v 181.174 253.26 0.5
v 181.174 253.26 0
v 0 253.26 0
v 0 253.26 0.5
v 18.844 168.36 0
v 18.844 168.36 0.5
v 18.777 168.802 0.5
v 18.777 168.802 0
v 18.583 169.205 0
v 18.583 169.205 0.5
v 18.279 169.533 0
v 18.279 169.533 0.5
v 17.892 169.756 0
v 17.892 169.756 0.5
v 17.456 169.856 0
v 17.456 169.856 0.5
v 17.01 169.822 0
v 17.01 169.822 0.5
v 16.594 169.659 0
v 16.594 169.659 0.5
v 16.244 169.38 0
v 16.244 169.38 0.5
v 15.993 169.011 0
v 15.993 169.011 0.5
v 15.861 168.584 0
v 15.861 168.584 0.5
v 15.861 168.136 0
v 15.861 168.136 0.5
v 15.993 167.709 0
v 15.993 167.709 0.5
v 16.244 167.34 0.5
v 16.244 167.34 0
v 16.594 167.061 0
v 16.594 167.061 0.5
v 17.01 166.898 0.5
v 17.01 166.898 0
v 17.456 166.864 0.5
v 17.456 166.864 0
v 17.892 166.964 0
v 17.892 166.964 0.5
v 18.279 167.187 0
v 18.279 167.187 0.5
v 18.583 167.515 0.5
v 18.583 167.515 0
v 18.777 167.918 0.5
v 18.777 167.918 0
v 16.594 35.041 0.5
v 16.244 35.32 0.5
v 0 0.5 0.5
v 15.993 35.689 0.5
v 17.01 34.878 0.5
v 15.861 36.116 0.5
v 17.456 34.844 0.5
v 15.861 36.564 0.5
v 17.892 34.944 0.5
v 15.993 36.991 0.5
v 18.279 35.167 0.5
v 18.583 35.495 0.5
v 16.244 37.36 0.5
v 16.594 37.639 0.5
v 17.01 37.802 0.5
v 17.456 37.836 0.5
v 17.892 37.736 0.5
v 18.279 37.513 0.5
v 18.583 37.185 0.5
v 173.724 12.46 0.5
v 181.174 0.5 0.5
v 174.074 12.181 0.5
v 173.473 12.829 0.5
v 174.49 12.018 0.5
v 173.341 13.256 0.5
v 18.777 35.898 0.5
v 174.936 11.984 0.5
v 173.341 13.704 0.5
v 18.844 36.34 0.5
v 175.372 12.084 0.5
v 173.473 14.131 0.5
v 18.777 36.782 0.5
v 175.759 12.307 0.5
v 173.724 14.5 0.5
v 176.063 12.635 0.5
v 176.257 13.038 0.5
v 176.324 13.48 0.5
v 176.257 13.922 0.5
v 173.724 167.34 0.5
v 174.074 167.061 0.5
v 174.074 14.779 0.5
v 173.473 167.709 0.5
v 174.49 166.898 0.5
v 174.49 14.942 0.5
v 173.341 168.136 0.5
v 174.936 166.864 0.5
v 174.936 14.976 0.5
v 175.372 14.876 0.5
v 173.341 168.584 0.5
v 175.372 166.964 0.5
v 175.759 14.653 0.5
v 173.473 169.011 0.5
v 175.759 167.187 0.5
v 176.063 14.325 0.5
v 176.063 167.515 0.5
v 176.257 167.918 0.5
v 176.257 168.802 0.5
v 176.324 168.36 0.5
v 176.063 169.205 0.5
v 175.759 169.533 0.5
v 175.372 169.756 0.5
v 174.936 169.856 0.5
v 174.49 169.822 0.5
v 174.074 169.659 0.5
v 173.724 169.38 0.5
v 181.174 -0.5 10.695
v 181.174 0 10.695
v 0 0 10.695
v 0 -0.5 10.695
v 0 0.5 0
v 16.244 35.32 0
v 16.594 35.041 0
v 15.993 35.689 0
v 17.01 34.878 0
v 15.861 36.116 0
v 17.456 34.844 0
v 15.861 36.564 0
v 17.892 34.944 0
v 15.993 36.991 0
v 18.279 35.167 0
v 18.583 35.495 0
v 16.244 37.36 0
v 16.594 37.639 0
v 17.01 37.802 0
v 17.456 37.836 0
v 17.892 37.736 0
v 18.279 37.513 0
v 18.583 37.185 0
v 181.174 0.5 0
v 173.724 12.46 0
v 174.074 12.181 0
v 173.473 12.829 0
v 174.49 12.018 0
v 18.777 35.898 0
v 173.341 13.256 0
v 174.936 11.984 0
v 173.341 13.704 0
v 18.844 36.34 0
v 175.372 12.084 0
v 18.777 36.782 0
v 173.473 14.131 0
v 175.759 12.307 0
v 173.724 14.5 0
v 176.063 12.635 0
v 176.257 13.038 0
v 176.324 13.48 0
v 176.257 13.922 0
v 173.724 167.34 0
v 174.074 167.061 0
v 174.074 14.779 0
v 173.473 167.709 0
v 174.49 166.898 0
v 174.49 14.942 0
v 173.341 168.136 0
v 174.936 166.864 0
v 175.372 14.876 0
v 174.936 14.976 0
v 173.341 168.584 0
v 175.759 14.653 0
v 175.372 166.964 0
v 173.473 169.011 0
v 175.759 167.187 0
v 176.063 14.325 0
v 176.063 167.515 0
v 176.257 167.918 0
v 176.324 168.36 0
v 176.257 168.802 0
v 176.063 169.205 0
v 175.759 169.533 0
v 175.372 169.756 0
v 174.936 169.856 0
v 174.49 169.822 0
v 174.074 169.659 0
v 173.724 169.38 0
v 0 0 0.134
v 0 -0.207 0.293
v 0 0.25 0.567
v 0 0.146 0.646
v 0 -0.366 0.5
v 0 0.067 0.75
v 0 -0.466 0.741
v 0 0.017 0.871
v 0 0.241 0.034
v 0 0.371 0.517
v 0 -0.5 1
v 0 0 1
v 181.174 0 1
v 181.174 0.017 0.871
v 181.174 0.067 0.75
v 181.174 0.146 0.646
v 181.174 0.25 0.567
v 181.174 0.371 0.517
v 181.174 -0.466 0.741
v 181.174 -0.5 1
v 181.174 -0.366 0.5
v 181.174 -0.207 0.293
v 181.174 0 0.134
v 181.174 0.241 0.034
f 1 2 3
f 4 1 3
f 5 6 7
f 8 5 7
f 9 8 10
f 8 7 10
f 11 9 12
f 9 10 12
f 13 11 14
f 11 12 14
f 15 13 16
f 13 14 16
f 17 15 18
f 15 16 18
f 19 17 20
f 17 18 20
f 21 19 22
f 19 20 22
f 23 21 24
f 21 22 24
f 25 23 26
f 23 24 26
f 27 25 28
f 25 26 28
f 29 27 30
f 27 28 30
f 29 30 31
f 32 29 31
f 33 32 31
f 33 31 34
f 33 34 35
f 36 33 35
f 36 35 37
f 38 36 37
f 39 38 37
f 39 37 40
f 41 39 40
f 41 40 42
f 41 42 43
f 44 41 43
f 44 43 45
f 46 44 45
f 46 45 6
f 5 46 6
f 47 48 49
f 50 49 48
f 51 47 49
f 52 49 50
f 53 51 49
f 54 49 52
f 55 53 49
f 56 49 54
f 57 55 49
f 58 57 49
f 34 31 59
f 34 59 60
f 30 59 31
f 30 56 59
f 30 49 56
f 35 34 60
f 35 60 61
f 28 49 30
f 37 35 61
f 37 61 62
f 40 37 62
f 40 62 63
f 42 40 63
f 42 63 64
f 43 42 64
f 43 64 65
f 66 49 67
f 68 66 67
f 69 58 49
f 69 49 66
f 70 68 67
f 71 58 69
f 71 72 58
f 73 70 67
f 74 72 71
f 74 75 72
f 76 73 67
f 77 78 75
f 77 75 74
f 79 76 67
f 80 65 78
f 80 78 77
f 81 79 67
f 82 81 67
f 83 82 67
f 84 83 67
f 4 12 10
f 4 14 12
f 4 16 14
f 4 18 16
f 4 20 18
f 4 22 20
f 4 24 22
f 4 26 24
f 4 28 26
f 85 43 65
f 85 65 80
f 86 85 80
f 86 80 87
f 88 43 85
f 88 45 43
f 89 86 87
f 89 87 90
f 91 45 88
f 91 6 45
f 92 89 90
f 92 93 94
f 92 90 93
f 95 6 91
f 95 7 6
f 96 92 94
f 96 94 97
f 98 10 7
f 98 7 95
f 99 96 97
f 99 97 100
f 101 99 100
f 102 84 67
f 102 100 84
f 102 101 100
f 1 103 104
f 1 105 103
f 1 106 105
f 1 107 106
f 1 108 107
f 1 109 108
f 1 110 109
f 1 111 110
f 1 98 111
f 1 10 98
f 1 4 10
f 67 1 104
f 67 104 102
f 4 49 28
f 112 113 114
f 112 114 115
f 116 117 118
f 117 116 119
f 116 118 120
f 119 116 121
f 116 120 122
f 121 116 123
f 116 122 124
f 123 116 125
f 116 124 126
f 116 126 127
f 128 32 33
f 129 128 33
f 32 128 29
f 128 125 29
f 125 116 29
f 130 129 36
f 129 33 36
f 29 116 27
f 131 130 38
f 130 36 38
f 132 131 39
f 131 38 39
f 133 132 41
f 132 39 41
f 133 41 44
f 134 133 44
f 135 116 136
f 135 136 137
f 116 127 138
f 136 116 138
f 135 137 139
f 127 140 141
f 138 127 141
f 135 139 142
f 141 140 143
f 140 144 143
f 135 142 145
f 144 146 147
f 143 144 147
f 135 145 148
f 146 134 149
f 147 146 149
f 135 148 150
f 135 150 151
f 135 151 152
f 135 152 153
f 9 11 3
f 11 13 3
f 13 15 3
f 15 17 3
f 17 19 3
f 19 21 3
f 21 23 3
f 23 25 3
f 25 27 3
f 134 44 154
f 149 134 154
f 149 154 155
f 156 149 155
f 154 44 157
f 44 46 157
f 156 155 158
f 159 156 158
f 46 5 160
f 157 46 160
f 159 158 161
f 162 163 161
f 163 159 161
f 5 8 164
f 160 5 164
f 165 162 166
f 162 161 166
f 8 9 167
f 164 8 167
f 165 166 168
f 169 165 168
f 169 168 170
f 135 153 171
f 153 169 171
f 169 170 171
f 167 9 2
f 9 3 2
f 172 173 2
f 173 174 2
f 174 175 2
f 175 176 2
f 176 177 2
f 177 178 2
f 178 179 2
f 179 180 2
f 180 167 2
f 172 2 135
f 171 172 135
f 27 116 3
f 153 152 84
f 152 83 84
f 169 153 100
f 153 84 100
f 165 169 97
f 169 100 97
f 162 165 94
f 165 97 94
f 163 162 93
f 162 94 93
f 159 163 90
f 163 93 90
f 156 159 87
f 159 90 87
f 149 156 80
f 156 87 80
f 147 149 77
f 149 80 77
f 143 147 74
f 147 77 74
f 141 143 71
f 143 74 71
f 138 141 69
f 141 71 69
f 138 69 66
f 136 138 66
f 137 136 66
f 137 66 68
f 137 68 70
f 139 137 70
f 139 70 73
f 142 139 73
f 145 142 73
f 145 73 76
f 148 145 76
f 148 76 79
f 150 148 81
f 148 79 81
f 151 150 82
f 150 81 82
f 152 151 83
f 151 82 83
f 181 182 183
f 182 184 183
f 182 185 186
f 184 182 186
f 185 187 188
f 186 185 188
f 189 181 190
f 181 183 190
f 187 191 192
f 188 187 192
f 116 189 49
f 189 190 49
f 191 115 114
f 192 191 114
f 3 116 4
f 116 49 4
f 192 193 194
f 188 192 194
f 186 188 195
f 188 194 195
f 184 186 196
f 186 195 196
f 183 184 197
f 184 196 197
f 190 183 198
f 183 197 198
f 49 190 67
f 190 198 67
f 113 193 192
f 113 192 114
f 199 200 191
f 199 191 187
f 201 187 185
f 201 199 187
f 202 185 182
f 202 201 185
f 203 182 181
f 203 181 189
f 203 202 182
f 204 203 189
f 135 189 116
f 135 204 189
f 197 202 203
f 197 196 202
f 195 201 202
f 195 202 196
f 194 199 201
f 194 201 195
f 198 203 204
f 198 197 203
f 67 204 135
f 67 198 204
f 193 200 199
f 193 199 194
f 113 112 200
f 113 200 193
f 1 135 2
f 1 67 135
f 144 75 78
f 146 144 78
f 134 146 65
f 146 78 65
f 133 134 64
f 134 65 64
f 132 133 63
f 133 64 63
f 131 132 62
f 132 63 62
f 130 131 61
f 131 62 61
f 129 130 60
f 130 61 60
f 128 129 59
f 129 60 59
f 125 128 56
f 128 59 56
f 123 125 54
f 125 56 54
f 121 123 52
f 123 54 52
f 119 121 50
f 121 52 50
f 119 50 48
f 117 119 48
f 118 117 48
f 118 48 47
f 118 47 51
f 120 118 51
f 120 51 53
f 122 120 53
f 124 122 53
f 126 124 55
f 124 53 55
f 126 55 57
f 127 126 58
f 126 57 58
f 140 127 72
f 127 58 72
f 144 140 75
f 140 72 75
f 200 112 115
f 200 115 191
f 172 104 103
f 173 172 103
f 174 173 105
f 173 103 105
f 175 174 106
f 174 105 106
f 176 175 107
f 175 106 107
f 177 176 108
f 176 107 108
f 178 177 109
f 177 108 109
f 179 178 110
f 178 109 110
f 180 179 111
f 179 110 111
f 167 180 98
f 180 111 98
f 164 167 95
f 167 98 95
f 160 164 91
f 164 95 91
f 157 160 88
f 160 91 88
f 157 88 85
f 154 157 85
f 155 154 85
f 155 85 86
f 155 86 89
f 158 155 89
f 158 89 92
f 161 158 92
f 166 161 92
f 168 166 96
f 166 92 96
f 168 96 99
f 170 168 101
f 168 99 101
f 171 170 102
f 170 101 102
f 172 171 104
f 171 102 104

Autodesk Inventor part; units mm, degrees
ref_plane "YZ Plane" through (0, 0, 0) normal (1, 0, 0) x (0, 1, 0)
ref_plane "XZ Plane" through (0, 0, 0) normal (0, 1, 0) x (-1, 0, 0)
ref_plane "XY Plane" through (0, 0, 0) normal (0, 0, 1) x (1, 0, 0)
sketch "Sketch1" plane through (0, 0, 0) normal (0, 0, 1) x (1, 0, 0)
  line L0 (0, 0) -> (181.174, 0)
  line L1 (181.174, 0) -> (181.174, 253.26)
  line L2 (181.174, 253.26) -> (0, 253.26)
  line L3 (0, 253.26) -> (0, 0)
  dimension "d0" = 181.174
  dimension "d1" = 253.26
extrude "Plate1" add sketch "Sketch1" along normal blind 0.5
sketch "Sketch2" plane through (181.174, 0, 0.5) normal (0, -1, 0) x (1, 0, 0)
  line L0 (-181.174, 0) -> (0, 0)
  line L1 (0, 0) -> (0, 10.195)
  line L2 (0, 10.195) -> (-181.174, 10.195)
  line L3 (-181.174, 10.195) -> (-181.174, 0)
edge flange "Flange1" height 10.695 angle 90 thickness 0.5 bend radius 0.5 thickness toward (0, -1, 0) relief tear relief width 0.5 relief depth 0.25 edges at (90.587, 0, 0.5) wall of the first edge with corners at (0, 0, 0.5) (181.174, 0, 0.5) (181.174, 0, 10.695) (0, 0, 10.695)
bend "Bend1"
corner "Corner1"
sketch "Sketch3" plane through (0, 0, 0.5) normal (0, 0, 1) x (1, 0, 0)
  line L0 (181.174, 253.26) -> (181.174, 0.5) projected
  line L1 (181.174, 253.26) -> (181.174, 168.36) construction
  line L2 (181.174, 168.36) -> (174.824, 168.36) construction
  line L3 (174.824, 168.36) -> (17.344, 168.36) construction
  line L4 (174.824, 168.36) -> (174.824, 13.48) construction
  circle A0 centre (174.824, 13.48) radius 1.5
  circle A1 centre (174.824, 168.36) radius 1.5
  circle A2 centre (17.344, 168.36) radius 1.5
  point P0 (0, 0)
  dimension "d13" = 84.9
  dimension "d14" = 6.35
  dimension "d15" = 157.48
  dimension "d16" = 154.88
  dimension "d17" = 3
  dimension "d18" = 3
  dimension "d19" = 3
extrude "Extrusion1" cut sketch "Sketch3" against normal blind 10
sketch "Sketch5" plane through (0, 0, 0.5) normal (0, 0, 1) x (1, 0, 0)
  circle A0 centre (17.344, 168.36) radius 1.5 projected
  line L0 (17.344, 168.36) -> (17.344, 35.808) construction
  line L1 (17.344, 168.36) -> (149.896, 168.36) construction
  line L2 (17.344, 35.808) -> (17.344, 36.34) construction
  circle A1 centre (17.344, 36.34) radius 1.5
  point P0 (0, 0)
  dimension "d28" = 90
  dimension "d32" = 0.532
  dimension "d33" = 3
extrude "Extrusion4" cut sketch "Sketch5" against normal blind 10 contours A1
equation "\"d2\" = Thickness"
equation "\"d3\" = BendReliefWidth"
equation "\"d4\" = BendReliefDepth"
equation "\"d5\" = MinimumRemnant"
equation "\"d6\" = TransitionRadius"
equation "\"d9\" = BendRadius"
equation "\"d10\" = CornerReliefSize"
equation "\"d11\" = GapSize"
equation "\"d12\" = JacobiRadiusSize"
equation "\"BendRadius\" = Thickness"
equation "\"BendReliefWidth\" = Thickness"
equation "\"BendReliefDepth\" = 0.5 * Thickness"
equation "\"CornerReliefSize\" = 4 * Thickness"
equation "\"MinimumRemnant\" = 2 * Thickness"
equation "\"TransitionRadius\" = BendRadius"
equation "\"JacobiRadiusSize\" = BendRadius"
equation "\"GapSize\" = Thickness"
equation "\"Thickness\" = 0.5"
properties part number "dads trunk"
